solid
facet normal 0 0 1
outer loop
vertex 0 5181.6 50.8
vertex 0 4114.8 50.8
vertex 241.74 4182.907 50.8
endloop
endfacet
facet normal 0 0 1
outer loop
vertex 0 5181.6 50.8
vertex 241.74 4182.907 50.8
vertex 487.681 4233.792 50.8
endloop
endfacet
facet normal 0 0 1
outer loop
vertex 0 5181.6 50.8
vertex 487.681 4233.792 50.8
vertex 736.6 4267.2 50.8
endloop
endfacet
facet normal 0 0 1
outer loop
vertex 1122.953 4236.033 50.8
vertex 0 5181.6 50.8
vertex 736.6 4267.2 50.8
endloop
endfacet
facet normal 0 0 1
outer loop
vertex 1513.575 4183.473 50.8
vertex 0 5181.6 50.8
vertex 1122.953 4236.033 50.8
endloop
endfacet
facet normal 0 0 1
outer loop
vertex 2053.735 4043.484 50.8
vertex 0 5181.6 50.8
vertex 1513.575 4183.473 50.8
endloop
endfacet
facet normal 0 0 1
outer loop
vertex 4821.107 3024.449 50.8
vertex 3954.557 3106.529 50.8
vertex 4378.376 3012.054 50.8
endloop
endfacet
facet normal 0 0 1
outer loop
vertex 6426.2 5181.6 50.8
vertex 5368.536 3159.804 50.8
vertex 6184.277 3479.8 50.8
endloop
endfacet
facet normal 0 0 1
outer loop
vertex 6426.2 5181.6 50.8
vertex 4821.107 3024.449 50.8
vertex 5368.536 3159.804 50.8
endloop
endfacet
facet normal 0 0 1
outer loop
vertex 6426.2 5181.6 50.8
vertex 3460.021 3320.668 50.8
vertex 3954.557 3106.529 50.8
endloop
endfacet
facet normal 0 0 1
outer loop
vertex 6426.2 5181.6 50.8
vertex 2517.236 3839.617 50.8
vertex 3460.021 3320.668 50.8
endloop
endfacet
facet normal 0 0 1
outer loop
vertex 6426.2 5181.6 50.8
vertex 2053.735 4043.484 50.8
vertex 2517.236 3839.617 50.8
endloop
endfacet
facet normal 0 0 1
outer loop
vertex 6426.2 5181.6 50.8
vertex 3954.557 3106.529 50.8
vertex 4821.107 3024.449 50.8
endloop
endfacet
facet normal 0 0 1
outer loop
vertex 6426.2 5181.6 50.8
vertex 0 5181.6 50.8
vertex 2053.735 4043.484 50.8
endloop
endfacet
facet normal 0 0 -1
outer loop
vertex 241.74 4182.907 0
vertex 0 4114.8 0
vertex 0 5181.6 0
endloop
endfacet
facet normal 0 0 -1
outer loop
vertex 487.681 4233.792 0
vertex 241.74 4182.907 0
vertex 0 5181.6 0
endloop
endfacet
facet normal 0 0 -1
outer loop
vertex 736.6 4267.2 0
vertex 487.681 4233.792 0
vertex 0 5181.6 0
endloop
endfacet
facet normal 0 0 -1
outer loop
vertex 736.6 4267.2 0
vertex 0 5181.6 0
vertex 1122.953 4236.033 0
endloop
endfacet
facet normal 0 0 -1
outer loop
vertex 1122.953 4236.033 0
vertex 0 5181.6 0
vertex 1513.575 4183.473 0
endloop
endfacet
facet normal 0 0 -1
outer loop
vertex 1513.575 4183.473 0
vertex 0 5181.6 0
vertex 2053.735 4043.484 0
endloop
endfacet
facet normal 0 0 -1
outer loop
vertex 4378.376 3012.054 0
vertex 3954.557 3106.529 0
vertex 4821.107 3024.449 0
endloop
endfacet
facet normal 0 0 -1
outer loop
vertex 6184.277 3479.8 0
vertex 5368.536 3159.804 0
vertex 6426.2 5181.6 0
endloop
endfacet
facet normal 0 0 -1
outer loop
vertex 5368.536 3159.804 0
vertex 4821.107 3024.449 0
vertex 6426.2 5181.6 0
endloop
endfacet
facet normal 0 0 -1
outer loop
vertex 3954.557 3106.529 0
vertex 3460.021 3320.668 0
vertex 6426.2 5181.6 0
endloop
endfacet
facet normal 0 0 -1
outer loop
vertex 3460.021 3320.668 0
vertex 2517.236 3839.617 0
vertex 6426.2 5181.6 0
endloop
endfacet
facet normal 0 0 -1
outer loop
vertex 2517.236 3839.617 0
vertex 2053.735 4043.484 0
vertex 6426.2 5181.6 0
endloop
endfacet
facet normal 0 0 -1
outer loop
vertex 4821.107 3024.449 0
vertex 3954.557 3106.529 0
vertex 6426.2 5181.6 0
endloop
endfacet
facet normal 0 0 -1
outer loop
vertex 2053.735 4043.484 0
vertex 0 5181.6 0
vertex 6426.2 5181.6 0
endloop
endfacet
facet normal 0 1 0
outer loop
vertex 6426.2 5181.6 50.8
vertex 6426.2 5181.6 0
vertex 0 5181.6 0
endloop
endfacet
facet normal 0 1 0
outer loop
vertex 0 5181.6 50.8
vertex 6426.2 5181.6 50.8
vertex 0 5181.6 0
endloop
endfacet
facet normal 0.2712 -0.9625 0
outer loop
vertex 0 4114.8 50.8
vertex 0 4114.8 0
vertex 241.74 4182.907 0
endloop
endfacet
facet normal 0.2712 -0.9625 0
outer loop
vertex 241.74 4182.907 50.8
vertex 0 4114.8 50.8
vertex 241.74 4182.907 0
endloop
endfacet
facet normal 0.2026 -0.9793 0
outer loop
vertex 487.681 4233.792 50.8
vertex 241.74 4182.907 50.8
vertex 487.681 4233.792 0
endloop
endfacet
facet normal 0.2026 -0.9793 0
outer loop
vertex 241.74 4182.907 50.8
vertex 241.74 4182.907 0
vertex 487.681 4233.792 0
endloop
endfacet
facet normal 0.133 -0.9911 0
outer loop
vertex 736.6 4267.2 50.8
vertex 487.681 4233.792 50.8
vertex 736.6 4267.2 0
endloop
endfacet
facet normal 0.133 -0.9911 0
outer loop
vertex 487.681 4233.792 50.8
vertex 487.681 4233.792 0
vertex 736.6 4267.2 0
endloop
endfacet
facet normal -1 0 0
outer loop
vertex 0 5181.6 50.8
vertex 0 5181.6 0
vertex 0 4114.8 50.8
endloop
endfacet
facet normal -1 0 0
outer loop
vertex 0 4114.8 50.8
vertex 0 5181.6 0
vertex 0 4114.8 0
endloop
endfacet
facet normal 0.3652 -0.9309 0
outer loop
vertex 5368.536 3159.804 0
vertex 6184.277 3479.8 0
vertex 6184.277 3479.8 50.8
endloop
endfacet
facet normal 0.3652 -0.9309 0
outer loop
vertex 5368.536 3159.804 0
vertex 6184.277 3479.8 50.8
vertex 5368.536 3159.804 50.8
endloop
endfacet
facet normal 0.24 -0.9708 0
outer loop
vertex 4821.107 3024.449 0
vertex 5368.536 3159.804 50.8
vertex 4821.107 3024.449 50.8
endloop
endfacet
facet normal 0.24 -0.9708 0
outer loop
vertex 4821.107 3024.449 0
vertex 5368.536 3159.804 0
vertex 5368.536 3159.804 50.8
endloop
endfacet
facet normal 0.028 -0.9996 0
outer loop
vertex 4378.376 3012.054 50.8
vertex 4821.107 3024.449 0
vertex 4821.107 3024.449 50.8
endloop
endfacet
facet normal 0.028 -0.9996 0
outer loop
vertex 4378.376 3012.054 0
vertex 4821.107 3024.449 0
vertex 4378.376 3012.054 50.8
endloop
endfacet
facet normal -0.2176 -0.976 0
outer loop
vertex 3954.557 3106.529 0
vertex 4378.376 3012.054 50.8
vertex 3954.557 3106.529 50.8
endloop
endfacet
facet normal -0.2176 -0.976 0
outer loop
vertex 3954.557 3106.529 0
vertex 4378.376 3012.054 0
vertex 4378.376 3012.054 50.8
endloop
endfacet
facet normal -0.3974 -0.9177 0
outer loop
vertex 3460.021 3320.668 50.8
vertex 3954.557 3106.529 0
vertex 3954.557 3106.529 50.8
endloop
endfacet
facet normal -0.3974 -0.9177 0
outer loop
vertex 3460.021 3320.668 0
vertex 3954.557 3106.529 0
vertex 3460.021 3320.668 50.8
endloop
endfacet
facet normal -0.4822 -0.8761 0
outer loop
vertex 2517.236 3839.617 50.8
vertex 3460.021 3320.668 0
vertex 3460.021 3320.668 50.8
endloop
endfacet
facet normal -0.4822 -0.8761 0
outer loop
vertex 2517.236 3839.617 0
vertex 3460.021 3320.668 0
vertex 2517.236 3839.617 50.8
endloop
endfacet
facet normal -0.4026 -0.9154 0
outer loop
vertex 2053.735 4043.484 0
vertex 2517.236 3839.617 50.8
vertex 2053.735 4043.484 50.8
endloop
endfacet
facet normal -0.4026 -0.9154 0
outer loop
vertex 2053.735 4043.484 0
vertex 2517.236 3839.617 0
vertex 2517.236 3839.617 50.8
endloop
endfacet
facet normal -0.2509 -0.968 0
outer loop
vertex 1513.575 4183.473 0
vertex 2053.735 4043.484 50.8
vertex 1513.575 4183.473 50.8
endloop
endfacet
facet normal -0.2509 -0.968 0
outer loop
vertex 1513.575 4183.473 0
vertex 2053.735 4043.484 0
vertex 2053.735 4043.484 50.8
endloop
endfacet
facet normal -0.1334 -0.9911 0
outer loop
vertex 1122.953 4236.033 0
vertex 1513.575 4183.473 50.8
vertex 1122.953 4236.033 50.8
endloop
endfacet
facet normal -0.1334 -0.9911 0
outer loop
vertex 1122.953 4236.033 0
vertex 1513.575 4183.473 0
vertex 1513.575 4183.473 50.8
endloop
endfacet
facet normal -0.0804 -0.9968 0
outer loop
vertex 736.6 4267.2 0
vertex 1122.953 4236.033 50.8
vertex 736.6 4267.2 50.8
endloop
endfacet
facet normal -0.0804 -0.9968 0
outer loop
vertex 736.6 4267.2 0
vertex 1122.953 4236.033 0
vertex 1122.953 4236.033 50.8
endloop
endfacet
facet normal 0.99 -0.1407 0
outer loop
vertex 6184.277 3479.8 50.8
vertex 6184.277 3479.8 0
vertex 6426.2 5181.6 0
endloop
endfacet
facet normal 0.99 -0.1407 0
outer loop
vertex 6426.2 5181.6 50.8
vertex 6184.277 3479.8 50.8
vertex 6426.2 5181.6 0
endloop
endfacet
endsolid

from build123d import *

# Parameters (mm, degrees)
F1_DEPTH = 50.8


with BuildPart() as f1:
    # F0 (on Top) → F1 (new body)
    with BuildSketch(Plane.XY):
        with BuildLine():
            Line((0, 5181.6), (0, 4114.8))
            ThreePointArc((0, 4114.8), (364.2613870406, 4210.519962637), (736.6, 4267.2))
            add(Edge.make_bspline(
                [(6184.2774509804, 3479.8), (5558.7493900267, 3226.3370934063), (4261.2002325915, 2605.0738530334), (2317.9505975893, 4149.0185862678), (1231.0061782159, 4232.3403238661), (736.6, 4267.2)],
                knots=[0, 0, 0, 0, 0.3371317616, 0.6987250434, 1, 1, 1, 1], degree=3))
            Line((6184.2774509804, 3479.8), (6426.2, 5181.6))
            Line((6426.2, 5181.6), (0, 5181.6))
        make_face()
    extrude(amount=F1_DEPTH)


solid = f1.part
